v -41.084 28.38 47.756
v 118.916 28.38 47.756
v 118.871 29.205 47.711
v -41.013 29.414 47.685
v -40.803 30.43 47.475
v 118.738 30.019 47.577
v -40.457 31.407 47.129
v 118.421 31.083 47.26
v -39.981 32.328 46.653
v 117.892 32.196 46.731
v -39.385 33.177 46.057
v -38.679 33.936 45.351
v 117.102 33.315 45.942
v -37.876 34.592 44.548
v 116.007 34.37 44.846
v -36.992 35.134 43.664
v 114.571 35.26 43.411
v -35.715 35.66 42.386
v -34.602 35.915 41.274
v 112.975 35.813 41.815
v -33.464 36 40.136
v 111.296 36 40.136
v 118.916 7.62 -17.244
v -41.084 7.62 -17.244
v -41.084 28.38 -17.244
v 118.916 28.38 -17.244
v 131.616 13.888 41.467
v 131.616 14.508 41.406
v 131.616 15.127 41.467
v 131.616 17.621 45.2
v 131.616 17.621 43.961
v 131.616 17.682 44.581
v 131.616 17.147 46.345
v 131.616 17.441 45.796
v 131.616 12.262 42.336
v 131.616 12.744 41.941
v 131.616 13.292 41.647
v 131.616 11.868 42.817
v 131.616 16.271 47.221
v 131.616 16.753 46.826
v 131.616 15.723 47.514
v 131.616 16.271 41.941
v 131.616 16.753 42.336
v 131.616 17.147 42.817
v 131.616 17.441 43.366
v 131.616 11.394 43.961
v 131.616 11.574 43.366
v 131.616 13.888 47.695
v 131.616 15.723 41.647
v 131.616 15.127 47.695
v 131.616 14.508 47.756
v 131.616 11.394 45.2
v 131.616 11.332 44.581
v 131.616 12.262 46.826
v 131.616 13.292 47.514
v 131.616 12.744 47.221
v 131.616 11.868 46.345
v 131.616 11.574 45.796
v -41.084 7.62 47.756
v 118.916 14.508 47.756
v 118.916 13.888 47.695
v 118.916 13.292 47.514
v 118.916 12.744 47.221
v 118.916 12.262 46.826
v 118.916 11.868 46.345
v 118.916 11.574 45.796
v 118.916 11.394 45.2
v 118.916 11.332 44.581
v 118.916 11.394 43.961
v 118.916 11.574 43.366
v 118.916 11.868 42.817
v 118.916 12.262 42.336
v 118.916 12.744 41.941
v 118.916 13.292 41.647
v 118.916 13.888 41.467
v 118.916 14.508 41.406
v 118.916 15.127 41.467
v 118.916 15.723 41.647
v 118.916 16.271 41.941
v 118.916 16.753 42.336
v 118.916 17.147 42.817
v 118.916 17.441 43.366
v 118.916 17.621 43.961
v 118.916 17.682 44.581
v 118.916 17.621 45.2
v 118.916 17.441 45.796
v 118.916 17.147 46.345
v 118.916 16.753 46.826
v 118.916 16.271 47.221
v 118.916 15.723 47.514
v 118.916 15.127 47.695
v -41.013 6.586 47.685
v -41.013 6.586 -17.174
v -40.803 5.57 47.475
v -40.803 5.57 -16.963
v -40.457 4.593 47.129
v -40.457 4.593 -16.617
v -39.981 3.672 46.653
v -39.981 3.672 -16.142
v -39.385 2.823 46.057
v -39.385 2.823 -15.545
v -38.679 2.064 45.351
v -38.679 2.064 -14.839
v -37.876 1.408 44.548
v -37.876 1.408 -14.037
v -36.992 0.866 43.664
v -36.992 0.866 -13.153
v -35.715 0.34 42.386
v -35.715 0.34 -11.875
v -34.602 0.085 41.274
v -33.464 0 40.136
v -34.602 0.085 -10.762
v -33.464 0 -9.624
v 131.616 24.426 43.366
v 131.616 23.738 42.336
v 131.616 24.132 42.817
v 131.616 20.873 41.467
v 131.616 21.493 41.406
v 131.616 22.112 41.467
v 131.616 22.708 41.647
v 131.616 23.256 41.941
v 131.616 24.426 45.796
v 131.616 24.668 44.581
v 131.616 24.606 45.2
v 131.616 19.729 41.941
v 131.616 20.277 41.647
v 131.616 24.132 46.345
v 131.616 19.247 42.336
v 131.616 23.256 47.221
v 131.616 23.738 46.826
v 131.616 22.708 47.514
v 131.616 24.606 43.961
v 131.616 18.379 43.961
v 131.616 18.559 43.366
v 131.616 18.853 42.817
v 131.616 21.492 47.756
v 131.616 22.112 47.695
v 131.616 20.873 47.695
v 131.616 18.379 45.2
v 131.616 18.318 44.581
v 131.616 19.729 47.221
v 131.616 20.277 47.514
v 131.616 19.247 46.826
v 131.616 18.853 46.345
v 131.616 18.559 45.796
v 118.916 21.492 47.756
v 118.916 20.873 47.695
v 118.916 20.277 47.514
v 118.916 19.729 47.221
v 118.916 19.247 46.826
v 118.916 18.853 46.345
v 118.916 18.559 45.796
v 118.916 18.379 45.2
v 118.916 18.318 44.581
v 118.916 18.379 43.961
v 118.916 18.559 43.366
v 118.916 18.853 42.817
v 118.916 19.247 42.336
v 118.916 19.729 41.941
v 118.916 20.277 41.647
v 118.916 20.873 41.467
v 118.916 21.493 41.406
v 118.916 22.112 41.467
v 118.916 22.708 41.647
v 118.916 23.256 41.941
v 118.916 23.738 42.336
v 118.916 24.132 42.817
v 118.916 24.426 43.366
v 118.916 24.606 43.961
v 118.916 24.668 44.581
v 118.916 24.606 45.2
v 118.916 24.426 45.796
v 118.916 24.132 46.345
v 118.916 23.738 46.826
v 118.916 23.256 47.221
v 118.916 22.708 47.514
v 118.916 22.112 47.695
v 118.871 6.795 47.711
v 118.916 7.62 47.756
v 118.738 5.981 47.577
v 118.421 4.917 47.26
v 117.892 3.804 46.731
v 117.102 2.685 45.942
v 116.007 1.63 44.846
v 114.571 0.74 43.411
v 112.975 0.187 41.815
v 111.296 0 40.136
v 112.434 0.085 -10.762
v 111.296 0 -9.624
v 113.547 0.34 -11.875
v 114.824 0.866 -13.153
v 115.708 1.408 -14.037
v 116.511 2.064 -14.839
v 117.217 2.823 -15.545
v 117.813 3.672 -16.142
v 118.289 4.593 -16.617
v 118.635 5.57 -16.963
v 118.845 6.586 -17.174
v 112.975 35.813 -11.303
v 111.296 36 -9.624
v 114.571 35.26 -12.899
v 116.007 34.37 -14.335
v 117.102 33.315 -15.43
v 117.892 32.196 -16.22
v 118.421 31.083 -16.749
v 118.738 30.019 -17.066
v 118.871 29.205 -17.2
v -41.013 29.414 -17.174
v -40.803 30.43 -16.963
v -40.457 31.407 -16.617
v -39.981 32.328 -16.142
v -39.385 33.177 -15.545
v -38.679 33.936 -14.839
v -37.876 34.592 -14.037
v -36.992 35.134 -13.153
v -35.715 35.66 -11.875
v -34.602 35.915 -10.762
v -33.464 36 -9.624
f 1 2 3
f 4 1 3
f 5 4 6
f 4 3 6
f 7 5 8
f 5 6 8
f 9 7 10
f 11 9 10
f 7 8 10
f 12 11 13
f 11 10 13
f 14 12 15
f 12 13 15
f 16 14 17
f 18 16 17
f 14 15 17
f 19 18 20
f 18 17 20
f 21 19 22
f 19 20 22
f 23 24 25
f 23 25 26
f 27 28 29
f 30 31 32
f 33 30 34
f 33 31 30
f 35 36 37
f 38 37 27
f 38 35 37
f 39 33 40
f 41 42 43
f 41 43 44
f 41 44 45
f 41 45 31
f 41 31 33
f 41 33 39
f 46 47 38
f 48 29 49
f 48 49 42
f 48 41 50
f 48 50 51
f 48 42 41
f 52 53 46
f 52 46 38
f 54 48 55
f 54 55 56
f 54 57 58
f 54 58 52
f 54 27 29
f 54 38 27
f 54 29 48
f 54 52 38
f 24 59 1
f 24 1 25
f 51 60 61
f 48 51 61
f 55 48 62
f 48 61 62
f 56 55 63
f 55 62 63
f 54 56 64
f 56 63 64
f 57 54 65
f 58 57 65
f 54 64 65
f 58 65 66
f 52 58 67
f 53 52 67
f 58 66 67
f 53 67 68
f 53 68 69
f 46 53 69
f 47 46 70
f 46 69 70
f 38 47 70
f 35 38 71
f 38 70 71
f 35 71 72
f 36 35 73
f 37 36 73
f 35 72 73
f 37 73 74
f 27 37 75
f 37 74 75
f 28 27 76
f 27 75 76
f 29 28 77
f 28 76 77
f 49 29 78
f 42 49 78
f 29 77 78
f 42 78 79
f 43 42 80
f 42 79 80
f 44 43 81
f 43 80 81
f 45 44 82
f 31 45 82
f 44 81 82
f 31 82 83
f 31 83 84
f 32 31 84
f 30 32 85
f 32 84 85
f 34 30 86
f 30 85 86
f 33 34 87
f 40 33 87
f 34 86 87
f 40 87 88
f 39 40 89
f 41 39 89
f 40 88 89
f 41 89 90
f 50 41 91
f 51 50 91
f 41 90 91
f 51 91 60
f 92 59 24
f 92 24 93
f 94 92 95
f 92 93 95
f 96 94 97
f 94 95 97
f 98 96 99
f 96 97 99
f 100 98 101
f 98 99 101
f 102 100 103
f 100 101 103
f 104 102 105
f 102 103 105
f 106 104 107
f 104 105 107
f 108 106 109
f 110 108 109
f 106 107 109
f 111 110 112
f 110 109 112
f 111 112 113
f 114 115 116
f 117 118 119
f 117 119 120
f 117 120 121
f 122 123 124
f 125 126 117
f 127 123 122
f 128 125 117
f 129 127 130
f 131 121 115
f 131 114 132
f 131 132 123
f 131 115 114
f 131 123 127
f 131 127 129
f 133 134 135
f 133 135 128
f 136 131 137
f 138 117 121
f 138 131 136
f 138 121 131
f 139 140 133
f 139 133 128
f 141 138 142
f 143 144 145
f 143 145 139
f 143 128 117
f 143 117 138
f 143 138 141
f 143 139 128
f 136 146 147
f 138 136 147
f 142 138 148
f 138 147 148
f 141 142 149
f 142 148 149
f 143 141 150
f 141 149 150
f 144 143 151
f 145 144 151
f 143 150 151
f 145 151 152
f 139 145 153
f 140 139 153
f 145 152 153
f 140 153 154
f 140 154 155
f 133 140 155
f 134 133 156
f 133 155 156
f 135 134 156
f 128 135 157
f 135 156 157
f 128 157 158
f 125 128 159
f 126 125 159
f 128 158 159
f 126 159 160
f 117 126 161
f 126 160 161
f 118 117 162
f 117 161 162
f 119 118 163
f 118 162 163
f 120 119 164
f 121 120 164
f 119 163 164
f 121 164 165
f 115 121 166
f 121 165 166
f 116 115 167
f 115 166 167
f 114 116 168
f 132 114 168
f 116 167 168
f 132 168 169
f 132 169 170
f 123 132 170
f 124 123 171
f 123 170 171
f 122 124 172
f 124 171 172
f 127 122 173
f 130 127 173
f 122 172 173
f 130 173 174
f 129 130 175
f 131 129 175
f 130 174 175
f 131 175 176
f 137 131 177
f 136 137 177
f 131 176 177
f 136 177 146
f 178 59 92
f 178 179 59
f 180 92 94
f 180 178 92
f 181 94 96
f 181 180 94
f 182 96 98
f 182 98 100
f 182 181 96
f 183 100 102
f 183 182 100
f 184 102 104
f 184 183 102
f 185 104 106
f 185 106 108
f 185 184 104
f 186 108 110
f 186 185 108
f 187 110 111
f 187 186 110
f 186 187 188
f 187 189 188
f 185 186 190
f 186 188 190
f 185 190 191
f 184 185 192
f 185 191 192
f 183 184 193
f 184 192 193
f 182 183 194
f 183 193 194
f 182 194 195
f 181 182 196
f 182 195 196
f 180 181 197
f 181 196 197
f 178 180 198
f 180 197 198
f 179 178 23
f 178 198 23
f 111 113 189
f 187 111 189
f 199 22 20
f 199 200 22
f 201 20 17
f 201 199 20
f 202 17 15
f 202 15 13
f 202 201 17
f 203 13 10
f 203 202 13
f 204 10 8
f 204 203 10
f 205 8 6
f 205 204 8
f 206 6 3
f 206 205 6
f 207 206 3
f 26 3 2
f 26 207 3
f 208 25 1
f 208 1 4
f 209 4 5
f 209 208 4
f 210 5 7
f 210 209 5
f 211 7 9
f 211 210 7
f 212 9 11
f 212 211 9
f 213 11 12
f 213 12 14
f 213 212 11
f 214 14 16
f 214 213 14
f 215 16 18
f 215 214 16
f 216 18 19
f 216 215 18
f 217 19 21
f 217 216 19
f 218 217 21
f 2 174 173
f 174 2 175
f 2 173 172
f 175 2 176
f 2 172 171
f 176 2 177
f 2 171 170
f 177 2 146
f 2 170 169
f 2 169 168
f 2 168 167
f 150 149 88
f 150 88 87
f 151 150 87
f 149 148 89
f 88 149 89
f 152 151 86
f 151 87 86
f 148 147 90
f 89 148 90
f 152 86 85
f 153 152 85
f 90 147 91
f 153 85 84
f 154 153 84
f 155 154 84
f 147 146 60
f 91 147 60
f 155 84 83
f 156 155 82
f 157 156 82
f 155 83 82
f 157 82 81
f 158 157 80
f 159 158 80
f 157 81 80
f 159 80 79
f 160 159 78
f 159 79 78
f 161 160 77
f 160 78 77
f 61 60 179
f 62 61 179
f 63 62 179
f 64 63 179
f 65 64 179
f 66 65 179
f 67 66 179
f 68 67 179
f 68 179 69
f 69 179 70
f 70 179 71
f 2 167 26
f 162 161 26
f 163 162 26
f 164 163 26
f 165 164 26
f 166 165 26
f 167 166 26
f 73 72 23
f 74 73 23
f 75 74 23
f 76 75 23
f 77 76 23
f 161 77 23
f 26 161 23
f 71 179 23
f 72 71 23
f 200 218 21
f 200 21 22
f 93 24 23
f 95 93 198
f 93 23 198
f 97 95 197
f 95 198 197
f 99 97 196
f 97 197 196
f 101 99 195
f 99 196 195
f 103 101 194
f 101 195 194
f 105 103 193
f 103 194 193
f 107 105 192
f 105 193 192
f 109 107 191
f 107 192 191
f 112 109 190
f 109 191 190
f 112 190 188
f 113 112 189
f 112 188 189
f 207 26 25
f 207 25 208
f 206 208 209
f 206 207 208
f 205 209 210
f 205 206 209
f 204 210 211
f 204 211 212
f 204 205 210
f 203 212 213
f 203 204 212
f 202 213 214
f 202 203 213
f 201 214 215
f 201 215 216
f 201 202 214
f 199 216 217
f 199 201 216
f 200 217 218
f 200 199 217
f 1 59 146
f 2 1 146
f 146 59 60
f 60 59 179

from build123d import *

# Parameters (mm, degrees)
SKETCH1_W           = 160
SKETCH1_H           = 65
BOSS_EXTRUDE1_DEPTH = 36
SKETCH2_R           = 3.175
BOSS_EXTRUDE3_DEPTH = 12.7
FILLET1_R           = 7.62


with BuildPart() as part:
    # Sketch1 → Boss-Extrude1 (new body)
    with BuildSketch(Plane(origin=(0, 0, 0), x_dir=(1, 0, 0), z_dir=(0, 1, 0))):
        with Locations((38.916030534, -15.255725191)):
            Rectangle(SKETCH1_W, SKETCH1_H)
    extrude(amount=BOSS_EXTRUDE1_DEPTH)

    # Sketch2 → Boss-Extrude3 (add)
    with BuildSketch(Plane(origin=(118.916030534, 0, 0), x_dir=(0, 0, -1), z_dir=(1, 0, 0))):
        with Locations(Location((-44.580725191, 21.4925, 0), (0, 0, 180))):
            Circle(SKETCH2_R)
        with Locations(Location((-44.580725191, 14.5075, 0), (0, 0, 180))):
            Circle(SKETCH2_R)
    extrude(amount=BOSS_EXTRUDE3_DEPTH)

    # Fillet1
    fillet1_edges = [part.edges().sort_by_distance(p)[0] for p in [
        (118.916030534, 36, 15.255725191),
        (38.916030534, 36, -17.244274809),
        (-41.083969466, 36, 15.255725191),
        (38.916030534, 0, -17.244274809),
        (118.916030534, 0, 15.255725191),
        (38.916030534, 0, 47.755725191),
        (-41.083969466, 0, 15.255725191),
        (38.916030534, 36, 47.755725191),
    ]]
    fillet(fillet1_edges, radius=FILLET1_R)


solid = part.part
